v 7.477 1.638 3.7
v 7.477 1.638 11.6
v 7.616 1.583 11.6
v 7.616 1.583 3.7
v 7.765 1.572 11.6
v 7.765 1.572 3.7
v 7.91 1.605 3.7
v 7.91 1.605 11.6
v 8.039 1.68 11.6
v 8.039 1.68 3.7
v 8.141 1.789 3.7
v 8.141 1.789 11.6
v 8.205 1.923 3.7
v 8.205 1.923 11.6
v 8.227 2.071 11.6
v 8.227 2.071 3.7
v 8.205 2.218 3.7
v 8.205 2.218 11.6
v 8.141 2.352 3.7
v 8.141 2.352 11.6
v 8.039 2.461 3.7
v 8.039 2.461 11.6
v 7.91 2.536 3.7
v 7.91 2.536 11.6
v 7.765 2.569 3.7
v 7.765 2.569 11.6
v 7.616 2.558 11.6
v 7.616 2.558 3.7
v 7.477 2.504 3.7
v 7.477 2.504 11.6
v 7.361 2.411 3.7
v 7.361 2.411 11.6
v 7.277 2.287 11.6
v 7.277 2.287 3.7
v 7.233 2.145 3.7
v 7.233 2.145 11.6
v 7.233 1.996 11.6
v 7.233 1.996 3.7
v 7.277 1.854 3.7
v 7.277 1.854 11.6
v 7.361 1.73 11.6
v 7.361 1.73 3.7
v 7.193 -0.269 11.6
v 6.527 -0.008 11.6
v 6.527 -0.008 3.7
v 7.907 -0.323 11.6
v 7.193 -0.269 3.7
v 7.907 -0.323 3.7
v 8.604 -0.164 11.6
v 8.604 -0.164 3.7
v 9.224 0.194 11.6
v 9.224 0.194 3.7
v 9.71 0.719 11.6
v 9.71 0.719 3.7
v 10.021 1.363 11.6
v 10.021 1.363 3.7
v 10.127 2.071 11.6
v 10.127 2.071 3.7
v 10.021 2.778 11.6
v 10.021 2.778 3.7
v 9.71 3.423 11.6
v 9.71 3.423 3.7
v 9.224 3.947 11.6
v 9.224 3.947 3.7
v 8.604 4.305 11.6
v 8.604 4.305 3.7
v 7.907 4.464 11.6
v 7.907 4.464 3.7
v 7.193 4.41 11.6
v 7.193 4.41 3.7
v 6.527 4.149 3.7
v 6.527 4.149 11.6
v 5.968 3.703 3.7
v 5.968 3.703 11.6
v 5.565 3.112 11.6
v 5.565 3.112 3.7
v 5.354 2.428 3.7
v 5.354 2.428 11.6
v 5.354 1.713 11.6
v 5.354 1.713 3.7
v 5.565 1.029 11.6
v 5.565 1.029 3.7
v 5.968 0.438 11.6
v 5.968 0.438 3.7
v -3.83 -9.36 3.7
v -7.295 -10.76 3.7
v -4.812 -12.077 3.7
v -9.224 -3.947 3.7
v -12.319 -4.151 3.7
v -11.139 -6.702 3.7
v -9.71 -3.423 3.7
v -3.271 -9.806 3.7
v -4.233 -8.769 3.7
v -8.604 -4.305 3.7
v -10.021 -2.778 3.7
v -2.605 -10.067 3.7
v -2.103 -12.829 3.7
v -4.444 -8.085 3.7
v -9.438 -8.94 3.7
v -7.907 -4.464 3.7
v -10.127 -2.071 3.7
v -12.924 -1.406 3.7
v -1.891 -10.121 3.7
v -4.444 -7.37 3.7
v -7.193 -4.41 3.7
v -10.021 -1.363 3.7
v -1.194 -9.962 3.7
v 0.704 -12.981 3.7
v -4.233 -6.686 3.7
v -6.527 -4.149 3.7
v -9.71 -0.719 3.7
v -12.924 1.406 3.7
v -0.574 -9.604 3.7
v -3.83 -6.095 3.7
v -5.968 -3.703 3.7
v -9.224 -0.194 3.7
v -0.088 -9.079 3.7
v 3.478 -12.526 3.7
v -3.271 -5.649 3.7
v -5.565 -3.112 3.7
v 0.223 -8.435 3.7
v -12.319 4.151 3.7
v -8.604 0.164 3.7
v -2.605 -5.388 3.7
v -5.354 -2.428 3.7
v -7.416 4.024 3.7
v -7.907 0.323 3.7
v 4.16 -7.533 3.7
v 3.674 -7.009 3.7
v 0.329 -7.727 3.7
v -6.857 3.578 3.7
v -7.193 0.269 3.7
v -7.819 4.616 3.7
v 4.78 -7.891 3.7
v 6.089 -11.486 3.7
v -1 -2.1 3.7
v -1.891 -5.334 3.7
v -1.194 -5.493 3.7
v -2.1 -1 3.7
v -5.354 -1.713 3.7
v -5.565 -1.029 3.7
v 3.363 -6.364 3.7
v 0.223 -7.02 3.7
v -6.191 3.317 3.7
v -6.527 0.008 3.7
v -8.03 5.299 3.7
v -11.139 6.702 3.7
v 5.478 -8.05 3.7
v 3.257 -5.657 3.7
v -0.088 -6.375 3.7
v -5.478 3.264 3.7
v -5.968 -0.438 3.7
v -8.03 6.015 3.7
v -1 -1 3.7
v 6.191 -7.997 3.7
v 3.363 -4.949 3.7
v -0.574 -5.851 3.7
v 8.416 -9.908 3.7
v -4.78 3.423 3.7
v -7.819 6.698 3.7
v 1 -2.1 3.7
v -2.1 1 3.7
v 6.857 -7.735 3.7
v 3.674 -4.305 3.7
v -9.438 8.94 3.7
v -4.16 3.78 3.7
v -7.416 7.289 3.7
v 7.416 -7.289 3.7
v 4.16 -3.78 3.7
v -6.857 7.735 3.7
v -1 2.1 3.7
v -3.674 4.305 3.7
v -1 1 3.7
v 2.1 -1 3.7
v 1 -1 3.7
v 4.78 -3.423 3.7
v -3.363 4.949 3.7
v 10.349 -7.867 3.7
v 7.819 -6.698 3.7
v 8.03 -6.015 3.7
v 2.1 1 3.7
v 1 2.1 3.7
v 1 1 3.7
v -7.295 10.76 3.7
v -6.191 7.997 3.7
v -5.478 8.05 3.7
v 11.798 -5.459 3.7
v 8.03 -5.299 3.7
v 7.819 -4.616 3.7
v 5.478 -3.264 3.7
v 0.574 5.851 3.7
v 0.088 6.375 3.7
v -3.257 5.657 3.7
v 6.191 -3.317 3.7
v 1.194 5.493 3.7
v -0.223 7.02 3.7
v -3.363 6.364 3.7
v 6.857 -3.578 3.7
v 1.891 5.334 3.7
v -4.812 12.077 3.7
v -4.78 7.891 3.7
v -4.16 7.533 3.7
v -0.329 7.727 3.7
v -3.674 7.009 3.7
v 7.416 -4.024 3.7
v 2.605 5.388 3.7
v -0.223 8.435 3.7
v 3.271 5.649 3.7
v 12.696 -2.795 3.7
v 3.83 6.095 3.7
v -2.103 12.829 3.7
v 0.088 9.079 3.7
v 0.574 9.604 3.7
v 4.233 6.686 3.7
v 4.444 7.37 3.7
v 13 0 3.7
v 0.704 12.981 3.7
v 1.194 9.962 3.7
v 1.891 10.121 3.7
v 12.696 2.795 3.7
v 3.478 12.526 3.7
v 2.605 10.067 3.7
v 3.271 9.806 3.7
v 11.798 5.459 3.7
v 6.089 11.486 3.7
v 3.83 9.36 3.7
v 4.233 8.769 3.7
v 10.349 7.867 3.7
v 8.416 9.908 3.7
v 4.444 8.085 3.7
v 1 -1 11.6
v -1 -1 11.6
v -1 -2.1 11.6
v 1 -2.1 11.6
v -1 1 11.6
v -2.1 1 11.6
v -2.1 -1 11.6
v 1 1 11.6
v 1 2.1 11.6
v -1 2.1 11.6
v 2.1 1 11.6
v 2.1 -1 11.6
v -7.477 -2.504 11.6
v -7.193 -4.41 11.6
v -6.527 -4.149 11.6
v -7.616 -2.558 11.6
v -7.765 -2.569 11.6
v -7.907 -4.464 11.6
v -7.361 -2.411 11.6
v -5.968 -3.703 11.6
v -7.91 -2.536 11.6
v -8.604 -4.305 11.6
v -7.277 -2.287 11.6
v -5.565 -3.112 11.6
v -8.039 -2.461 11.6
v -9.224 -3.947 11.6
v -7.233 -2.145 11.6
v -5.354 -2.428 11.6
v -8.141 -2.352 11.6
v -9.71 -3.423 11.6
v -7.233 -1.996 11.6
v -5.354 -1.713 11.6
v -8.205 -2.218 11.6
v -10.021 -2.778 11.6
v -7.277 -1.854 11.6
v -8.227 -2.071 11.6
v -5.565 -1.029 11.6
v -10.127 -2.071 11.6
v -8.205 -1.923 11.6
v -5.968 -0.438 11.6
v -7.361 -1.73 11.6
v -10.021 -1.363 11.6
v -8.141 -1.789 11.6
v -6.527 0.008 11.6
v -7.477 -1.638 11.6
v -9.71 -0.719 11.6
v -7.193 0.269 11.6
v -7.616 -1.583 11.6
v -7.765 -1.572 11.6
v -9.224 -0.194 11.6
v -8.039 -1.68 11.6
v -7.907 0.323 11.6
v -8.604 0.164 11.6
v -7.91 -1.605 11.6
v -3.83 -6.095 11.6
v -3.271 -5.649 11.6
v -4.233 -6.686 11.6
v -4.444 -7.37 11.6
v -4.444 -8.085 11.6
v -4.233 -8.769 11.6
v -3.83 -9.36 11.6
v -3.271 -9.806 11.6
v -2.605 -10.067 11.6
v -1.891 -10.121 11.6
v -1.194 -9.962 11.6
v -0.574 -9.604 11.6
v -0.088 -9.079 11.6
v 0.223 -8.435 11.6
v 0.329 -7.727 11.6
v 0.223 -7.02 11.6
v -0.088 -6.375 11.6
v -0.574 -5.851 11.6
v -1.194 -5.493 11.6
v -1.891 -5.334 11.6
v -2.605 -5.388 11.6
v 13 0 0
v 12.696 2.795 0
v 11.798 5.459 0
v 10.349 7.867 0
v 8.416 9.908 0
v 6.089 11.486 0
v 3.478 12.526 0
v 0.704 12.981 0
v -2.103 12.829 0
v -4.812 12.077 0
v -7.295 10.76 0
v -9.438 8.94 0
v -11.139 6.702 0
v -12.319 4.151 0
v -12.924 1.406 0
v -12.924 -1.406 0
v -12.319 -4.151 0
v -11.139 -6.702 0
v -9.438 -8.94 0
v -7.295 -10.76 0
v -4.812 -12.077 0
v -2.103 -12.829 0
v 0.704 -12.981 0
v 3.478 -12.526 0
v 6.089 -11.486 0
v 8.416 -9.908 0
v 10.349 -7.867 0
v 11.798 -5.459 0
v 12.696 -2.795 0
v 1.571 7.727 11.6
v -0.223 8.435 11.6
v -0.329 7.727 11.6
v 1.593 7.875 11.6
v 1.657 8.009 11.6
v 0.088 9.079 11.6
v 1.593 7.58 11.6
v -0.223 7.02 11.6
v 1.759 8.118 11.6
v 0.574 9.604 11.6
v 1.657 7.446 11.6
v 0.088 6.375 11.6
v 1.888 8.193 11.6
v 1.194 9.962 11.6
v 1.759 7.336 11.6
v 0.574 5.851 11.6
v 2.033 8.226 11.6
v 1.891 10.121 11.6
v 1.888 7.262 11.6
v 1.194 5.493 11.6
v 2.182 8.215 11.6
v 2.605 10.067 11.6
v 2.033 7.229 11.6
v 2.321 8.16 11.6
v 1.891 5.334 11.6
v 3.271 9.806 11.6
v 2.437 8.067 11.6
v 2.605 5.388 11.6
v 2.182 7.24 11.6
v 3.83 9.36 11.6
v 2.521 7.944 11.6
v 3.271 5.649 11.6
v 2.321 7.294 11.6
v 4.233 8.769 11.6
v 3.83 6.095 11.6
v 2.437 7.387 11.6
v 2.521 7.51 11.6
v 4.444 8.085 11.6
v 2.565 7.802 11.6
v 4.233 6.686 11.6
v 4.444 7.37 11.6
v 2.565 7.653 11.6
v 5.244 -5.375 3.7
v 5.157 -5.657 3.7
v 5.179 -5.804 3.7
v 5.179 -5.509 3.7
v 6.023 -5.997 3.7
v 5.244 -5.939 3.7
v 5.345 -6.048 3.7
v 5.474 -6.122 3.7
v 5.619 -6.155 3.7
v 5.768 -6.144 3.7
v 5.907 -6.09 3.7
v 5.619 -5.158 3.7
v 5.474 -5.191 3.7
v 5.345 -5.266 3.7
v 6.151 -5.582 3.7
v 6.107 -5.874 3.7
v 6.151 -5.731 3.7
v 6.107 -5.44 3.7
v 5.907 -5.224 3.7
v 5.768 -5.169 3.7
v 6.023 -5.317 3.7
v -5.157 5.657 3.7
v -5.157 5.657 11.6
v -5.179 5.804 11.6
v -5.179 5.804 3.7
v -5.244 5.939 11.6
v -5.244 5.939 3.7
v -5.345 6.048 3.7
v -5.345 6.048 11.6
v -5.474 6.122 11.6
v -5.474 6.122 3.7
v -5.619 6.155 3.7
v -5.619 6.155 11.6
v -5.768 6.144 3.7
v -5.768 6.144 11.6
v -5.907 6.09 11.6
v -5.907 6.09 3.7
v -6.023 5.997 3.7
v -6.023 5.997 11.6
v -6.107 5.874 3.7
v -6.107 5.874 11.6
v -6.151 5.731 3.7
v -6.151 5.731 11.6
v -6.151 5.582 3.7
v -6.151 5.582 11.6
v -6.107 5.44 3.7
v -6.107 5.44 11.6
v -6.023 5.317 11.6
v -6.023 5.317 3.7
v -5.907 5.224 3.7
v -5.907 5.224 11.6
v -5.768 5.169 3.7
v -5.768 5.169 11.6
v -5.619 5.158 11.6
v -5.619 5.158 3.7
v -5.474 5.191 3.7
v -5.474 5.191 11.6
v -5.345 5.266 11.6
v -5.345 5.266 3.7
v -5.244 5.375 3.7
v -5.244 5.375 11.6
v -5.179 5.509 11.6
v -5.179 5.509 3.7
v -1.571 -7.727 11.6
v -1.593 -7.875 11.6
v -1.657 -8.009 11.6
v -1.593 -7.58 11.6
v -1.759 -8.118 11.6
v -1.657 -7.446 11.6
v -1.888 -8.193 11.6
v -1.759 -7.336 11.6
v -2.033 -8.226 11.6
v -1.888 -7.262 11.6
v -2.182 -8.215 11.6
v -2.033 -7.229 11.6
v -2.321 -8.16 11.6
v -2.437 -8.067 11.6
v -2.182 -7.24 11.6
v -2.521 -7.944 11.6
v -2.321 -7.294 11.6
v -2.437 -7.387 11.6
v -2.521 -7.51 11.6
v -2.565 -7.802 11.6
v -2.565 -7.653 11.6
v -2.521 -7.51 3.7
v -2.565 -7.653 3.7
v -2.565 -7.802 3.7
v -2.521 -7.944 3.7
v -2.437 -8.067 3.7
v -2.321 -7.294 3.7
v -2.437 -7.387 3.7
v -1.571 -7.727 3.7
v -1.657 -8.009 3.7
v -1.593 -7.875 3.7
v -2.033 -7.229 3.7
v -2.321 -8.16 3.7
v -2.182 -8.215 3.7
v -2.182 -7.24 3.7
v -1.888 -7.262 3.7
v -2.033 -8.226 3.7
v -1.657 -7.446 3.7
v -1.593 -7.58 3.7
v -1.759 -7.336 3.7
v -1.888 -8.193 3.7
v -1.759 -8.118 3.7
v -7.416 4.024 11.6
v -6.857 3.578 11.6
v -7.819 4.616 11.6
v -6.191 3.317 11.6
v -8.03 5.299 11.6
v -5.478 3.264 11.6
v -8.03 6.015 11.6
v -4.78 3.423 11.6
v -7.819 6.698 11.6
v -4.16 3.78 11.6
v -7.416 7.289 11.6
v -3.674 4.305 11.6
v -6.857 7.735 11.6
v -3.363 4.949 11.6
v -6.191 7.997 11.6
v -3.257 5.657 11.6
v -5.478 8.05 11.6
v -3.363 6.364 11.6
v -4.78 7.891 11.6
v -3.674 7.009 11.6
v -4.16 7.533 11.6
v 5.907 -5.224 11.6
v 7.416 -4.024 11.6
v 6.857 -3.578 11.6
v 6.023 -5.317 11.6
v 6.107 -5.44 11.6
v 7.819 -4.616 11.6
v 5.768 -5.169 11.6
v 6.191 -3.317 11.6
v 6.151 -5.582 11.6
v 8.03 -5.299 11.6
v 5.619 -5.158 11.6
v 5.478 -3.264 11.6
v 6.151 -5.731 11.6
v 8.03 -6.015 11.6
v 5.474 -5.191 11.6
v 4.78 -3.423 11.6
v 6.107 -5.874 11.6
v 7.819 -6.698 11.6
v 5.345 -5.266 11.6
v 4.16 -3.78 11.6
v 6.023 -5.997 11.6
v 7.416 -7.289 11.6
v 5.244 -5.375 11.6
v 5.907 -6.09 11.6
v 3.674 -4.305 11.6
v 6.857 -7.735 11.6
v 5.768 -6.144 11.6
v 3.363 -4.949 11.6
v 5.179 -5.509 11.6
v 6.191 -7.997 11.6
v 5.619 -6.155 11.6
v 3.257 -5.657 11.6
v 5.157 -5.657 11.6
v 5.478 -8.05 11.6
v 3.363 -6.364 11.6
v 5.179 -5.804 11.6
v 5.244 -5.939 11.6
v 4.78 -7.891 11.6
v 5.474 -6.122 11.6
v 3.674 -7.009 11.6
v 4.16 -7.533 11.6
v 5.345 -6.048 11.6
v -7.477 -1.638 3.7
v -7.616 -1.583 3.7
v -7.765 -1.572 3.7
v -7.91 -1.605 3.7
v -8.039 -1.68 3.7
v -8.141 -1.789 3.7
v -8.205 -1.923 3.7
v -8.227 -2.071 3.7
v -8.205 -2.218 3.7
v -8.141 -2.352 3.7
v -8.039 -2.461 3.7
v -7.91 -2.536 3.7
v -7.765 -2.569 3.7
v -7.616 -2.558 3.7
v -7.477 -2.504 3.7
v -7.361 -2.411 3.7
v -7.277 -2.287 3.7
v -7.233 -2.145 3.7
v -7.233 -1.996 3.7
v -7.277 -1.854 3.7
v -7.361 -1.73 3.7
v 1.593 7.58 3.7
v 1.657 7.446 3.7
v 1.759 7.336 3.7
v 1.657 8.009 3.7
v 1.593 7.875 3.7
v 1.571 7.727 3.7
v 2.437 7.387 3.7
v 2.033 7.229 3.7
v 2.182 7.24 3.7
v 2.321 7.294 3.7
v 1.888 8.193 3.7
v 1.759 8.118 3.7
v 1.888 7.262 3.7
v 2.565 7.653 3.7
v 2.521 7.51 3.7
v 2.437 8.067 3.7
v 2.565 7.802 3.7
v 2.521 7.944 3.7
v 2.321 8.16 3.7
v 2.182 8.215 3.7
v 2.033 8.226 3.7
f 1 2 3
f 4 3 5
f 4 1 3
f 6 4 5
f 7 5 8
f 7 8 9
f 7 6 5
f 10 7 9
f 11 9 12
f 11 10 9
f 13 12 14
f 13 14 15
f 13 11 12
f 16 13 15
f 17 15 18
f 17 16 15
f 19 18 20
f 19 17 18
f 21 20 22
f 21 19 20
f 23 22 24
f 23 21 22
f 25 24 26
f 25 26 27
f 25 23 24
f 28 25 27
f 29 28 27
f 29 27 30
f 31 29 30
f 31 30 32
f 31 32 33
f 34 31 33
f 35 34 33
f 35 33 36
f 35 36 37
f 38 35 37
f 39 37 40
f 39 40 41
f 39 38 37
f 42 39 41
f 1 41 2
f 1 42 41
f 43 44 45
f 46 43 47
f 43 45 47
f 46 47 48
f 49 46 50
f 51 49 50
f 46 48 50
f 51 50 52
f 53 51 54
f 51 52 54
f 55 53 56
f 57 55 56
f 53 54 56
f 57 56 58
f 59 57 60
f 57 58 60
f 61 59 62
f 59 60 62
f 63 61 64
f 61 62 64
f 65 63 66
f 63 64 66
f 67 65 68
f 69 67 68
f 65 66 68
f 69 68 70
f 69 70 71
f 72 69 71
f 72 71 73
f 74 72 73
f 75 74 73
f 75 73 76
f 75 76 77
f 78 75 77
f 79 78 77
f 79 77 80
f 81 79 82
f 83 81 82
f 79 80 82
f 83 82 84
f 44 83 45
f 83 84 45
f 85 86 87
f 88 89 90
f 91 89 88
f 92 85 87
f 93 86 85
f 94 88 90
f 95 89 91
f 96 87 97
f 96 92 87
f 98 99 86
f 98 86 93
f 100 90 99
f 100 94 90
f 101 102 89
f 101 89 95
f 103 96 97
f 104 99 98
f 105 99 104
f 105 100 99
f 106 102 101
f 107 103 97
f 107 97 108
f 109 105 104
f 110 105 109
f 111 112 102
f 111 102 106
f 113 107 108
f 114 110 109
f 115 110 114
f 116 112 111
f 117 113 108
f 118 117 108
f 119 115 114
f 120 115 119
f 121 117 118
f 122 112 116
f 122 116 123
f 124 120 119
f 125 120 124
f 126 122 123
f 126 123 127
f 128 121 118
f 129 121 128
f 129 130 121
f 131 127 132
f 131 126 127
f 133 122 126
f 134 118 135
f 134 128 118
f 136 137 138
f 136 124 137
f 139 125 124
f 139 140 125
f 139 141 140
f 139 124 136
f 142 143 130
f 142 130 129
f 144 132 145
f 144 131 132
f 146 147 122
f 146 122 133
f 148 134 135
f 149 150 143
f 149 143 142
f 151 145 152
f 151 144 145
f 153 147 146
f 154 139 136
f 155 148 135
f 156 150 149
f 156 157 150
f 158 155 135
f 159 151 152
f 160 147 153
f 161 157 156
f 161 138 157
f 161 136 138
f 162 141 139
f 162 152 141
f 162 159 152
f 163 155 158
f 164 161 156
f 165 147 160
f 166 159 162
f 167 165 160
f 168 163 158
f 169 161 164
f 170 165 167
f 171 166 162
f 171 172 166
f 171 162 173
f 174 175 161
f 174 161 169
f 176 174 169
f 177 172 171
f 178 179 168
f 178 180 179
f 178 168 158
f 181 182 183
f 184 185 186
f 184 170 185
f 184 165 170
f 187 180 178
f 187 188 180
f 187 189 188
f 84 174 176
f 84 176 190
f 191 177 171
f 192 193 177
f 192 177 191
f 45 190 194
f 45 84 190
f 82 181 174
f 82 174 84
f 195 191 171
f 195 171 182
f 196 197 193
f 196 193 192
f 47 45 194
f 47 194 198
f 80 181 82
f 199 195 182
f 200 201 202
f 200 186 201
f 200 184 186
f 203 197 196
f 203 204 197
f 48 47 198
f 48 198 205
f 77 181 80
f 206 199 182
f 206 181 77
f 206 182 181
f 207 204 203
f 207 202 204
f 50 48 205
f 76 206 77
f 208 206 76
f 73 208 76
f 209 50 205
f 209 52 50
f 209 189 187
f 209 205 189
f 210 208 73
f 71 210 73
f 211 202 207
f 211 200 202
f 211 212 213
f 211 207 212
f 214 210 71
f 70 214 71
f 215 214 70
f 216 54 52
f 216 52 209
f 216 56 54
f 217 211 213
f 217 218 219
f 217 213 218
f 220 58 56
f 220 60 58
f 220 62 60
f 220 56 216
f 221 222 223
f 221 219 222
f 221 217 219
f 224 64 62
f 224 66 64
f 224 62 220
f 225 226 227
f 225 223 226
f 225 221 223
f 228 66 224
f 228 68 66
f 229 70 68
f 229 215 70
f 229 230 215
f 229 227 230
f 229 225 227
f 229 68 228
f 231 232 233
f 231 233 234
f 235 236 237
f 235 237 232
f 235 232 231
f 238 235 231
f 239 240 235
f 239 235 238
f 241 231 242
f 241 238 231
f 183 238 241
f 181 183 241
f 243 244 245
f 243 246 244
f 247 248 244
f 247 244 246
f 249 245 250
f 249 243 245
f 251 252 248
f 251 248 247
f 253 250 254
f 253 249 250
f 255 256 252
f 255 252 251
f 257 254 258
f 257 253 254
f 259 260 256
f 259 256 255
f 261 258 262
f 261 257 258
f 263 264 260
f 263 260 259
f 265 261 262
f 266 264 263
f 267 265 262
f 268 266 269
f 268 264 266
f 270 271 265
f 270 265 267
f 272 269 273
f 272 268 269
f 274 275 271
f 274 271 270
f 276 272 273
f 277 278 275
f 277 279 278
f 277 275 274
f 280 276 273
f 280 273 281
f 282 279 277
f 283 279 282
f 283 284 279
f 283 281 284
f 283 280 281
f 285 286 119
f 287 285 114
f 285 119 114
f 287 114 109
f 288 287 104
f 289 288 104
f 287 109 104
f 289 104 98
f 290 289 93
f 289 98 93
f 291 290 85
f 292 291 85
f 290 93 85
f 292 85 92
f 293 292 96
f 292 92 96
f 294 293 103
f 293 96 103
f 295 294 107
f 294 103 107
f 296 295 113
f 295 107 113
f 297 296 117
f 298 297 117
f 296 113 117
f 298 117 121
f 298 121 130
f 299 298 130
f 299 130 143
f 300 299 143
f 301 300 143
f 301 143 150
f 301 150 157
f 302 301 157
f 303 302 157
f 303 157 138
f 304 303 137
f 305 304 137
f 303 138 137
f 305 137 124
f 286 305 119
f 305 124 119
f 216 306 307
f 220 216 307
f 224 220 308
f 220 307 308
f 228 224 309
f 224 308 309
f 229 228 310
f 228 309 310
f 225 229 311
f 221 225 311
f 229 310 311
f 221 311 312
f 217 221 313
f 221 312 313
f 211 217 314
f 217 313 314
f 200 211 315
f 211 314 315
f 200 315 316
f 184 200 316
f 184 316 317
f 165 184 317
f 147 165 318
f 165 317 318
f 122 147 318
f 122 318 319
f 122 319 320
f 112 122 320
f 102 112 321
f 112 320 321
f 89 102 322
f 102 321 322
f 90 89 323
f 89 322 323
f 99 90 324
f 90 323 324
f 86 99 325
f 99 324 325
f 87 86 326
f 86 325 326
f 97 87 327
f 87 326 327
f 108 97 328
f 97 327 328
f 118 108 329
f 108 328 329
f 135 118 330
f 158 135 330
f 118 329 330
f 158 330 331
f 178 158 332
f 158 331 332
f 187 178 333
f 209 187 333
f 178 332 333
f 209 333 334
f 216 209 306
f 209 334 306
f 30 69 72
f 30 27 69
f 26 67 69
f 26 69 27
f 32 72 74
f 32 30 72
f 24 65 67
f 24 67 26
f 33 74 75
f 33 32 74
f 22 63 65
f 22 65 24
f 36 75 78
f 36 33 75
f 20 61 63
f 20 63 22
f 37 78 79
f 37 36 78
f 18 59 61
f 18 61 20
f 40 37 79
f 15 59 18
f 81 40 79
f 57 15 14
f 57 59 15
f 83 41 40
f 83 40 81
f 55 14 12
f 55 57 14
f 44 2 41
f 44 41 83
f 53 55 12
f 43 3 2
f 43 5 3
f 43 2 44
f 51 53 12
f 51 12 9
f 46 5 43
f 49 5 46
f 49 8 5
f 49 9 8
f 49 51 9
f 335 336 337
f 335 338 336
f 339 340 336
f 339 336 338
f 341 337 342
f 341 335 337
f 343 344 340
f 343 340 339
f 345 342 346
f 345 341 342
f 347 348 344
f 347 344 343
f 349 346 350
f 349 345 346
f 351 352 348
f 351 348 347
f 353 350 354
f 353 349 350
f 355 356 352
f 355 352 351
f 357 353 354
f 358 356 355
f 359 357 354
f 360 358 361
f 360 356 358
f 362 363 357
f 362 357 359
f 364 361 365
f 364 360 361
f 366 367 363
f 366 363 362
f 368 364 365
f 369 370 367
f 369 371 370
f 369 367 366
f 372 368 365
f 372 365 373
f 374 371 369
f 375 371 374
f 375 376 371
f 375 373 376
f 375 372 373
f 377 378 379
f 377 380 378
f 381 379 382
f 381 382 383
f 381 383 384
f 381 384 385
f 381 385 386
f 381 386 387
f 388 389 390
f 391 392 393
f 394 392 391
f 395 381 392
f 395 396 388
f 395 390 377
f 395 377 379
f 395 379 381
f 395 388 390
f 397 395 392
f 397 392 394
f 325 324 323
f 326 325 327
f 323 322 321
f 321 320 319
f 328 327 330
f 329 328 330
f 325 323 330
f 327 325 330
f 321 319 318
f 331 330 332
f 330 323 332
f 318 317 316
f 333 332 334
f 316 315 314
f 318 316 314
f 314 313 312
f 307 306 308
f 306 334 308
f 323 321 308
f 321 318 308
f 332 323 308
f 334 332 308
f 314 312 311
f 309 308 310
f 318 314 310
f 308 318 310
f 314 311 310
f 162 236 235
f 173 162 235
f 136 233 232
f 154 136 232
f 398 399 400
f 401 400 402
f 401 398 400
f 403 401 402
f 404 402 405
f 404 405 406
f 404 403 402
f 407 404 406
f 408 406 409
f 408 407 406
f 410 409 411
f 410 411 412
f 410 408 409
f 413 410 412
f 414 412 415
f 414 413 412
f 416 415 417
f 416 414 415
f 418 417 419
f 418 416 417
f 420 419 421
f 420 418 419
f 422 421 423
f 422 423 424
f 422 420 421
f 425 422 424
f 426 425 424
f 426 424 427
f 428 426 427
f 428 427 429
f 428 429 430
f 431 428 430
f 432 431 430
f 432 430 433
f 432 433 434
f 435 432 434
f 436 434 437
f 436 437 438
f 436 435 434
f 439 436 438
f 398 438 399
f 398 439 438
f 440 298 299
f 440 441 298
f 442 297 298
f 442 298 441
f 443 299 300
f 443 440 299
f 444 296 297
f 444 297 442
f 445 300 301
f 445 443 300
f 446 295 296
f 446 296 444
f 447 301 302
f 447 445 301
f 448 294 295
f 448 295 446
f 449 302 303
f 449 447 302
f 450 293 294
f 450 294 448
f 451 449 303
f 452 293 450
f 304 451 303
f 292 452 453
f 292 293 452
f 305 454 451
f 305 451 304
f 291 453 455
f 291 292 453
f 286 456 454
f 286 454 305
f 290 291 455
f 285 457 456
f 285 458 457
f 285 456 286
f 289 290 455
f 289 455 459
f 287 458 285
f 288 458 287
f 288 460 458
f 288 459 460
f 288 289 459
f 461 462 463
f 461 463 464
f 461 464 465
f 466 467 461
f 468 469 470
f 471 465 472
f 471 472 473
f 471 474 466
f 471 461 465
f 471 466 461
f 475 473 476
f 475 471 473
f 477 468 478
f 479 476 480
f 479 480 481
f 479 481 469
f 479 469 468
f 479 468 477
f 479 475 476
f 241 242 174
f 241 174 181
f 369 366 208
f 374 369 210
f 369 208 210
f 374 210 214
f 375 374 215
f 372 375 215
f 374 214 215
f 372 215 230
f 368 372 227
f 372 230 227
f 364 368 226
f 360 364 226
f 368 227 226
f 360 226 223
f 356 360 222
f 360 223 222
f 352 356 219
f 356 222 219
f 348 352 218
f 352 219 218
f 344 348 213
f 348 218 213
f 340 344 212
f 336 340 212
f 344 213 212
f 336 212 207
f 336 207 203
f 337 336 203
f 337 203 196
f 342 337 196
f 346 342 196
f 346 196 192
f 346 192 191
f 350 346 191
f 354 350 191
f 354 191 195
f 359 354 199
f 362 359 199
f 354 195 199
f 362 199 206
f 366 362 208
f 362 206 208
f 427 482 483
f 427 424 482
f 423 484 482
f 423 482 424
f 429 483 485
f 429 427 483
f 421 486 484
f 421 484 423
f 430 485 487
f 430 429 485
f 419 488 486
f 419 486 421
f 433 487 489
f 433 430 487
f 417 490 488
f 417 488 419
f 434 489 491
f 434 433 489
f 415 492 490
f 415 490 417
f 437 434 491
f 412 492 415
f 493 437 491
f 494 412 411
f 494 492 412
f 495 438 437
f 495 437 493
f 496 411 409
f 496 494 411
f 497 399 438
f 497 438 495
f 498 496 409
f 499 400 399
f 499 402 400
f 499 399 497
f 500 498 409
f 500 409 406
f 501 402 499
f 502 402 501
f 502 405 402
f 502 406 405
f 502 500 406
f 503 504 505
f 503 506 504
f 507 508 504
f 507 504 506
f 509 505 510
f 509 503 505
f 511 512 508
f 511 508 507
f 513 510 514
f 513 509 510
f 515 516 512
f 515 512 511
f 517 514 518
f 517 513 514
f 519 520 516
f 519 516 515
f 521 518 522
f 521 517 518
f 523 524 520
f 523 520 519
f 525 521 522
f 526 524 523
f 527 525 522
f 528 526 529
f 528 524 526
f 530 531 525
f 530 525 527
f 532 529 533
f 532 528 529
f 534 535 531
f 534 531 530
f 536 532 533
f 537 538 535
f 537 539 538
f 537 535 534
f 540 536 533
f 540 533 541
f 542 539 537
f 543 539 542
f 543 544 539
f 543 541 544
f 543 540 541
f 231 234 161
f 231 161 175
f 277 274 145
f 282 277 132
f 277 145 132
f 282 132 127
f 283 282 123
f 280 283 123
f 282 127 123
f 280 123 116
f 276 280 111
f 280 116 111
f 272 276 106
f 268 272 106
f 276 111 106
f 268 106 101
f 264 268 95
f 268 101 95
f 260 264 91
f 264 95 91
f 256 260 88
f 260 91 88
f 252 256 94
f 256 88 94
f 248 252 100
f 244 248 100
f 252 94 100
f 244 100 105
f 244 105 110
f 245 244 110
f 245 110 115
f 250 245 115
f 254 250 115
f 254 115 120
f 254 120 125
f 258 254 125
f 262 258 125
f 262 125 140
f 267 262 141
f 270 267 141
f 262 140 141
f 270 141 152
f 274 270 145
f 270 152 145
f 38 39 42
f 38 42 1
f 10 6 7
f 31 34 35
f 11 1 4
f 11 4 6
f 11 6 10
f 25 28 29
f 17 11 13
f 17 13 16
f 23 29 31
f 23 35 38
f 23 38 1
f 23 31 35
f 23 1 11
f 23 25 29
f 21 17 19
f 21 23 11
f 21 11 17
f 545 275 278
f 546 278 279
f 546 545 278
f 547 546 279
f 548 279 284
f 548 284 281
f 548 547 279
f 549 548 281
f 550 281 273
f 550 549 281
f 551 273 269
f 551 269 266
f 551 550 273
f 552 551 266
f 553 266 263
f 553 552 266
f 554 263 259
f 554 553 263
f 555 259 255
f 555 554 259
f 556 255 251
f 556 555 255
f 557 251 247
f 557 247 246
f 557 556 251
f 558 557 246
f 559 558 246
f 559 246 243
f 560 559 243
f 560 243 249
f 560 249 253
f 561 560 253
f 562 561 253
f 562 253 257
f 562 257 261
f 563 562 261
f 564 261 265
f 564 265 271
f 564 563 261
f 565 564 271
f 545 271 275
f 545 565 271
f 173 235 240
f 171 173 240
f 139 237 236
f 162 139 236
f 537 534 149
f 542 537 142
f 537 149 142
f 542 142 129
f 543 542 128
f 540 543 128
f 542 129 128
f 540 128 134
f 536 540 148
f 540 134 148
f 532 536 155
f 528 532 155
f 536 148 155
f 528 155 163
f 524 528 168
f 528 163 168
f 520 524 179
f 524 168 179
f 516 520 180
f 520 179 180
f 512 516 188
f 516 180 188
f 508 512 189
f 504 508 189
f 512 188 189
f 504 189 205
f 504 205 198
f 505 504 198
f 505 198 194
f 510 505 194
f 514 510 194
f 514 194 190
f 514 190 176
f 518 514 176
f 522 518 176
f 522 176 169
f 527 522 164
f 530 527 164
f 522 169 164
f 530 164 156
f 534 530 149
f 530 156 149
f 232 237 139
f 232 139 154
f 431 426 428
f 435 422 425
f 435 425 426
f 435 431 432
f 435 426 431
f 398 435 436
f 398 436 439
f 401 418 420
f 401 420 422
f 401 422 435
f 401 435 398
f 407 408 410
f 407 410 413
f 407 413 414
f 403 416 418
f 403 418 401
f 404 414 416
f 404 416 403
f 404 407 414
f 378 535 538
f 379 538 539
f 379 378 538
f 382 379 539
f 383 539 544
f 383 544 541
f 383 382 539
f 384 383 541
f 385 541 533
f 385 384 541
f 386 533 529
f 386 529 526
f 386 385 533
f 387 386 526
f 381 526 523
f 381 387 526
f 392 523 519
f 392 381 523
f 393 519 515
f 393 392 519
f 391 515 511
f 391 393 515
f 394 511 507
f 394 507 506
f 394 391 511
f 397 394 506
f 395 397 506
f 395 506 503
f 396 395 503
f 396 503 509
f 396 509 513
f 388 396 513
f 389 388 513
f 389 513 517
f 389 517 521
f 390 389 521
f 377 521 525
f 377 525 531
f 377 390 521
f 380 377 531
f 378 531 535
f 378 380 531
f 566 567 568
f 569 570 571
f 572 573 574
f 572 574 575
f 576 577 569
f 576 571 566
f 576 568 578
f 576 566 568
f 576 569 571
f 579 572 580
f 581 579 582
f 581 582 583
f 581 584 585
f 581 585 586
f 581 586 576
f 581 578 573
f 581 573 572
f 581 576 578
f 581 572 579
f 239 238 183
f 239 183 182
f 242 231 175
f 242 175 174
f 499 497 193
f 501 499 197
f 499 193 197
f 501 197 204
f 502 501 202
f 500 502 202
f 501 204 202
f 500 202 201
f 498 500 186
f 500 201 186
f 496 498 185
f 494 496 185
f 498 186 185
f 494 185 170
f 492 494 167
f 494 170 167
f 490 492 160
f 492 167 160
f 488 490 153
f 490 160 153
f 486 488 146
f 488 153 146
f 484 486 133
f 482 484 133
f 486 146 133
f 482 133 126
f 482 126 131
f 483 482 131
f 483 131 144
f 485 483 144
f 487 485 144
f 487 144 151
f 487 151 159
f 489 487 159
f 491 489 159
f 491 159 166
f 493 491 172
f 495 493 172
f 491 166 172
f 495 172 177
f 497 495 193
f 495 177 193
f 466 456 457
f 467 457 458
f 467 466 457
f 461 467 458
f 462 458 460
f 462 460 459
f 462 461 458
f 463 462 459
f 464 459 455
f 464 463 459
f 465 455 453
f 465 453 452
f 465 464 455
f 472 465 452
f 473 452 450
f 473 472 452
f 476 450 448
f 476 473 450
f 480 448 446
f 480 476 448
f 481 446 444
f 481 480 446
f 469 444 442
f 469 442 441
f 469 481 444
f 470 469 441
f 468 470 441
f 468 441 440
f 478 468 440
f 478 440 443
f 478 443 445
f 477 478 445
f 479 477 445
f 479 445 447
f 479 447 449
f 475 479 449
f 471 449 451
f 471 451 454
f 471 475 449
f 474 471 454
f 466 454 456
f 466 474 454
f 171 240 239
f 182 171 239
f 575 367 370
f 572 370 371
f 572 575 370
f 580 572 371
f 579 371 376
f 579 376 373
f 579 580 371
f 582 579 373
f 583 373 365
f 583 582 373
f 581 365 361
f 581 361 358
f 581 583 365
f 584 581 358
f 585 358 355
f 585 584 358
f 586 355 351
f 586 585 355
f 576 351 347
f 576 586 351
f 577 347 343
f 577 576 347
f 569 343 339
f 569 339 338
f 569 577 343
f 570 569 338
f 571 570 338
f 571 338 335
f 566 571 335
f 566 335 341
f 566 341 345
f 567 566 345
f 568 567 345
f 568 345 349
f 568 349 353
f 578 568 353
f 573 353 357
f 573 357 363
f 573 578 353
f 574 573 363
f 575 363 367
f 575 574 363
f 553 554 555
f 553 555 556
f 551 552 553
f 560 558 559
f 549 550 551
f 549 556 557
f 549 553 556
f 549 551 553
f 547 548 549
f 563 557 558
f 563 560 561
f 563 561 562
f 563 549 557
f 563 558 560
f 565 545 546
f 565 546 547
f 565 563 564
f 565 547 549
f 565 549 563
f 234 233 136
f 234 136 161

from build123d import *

# Parameters (mm, degrees)
SKETCH_1_R               = 13
EXTRUDE_1_DEPTH          = 3.7
SKETCH_2_W               = 2
SKETCH_2_H               = 4.2
SKETCH_2_W_2             = 4.2
SKETCH_2_H_2             = 2
EXTRUDE_2_DEPTH          = 7.9
SKETCH_3_R               = 2.4
SKETCH_3_R_2             = 0.5
EXTRUDE_3_DEPTH          = 7.9
PATTERN_CIRCULAR_1_COUNT = 6


with BuildPart() as part:
    # 草图1 → 凸台-拉伸1 (new body)
    with BuildSketch(Plane.XY):
        Circle(SKETCH_1_R)
    extrude(amount=EXTRUDE_1_DEPTH)

    # 草图2 → 凸台-拉伸2 (add)
    with BuildSketch(Plane.XY.offset(3.7)):
        Rectangle(SKETCH_2_W, SKETCH_2_H)
        Rectangle(SKETCH_2_W_2, SKETCH_2_H_2)
    extrude(amount=EXTRUDE_2_DEPTH)

    # 草图3 → 凸台-拉伸3 (add)
    with BuildSketch(Plane.XY.offset(3.7)):
        with Locations((-5.656854249, 5.656854249)):
            Circle(SKETCH_3_R)
        with Locations((-5.656854249, 5.656854249)):
            Circle(SKETCH_3_R_2, mode=Mode.SUBTRACT)
    extrude_3 = extrude(amount=EXTRUDE_3_DEPTH)

    # 阵列(圆周)1: 凸台-拉伸3 ×6 about axis
    pattern_circular_1_axis = Axis((0, 0, 0), (0, 0, 1))
    for i in range(1, PATTERN_CIRCULAR_1_COUNT):
        add(extrude_3.rotate(pattern_circular_1_axis, i * 360 / PATTERN_CIRCULAR_1_COUNT))


solid = part.part
